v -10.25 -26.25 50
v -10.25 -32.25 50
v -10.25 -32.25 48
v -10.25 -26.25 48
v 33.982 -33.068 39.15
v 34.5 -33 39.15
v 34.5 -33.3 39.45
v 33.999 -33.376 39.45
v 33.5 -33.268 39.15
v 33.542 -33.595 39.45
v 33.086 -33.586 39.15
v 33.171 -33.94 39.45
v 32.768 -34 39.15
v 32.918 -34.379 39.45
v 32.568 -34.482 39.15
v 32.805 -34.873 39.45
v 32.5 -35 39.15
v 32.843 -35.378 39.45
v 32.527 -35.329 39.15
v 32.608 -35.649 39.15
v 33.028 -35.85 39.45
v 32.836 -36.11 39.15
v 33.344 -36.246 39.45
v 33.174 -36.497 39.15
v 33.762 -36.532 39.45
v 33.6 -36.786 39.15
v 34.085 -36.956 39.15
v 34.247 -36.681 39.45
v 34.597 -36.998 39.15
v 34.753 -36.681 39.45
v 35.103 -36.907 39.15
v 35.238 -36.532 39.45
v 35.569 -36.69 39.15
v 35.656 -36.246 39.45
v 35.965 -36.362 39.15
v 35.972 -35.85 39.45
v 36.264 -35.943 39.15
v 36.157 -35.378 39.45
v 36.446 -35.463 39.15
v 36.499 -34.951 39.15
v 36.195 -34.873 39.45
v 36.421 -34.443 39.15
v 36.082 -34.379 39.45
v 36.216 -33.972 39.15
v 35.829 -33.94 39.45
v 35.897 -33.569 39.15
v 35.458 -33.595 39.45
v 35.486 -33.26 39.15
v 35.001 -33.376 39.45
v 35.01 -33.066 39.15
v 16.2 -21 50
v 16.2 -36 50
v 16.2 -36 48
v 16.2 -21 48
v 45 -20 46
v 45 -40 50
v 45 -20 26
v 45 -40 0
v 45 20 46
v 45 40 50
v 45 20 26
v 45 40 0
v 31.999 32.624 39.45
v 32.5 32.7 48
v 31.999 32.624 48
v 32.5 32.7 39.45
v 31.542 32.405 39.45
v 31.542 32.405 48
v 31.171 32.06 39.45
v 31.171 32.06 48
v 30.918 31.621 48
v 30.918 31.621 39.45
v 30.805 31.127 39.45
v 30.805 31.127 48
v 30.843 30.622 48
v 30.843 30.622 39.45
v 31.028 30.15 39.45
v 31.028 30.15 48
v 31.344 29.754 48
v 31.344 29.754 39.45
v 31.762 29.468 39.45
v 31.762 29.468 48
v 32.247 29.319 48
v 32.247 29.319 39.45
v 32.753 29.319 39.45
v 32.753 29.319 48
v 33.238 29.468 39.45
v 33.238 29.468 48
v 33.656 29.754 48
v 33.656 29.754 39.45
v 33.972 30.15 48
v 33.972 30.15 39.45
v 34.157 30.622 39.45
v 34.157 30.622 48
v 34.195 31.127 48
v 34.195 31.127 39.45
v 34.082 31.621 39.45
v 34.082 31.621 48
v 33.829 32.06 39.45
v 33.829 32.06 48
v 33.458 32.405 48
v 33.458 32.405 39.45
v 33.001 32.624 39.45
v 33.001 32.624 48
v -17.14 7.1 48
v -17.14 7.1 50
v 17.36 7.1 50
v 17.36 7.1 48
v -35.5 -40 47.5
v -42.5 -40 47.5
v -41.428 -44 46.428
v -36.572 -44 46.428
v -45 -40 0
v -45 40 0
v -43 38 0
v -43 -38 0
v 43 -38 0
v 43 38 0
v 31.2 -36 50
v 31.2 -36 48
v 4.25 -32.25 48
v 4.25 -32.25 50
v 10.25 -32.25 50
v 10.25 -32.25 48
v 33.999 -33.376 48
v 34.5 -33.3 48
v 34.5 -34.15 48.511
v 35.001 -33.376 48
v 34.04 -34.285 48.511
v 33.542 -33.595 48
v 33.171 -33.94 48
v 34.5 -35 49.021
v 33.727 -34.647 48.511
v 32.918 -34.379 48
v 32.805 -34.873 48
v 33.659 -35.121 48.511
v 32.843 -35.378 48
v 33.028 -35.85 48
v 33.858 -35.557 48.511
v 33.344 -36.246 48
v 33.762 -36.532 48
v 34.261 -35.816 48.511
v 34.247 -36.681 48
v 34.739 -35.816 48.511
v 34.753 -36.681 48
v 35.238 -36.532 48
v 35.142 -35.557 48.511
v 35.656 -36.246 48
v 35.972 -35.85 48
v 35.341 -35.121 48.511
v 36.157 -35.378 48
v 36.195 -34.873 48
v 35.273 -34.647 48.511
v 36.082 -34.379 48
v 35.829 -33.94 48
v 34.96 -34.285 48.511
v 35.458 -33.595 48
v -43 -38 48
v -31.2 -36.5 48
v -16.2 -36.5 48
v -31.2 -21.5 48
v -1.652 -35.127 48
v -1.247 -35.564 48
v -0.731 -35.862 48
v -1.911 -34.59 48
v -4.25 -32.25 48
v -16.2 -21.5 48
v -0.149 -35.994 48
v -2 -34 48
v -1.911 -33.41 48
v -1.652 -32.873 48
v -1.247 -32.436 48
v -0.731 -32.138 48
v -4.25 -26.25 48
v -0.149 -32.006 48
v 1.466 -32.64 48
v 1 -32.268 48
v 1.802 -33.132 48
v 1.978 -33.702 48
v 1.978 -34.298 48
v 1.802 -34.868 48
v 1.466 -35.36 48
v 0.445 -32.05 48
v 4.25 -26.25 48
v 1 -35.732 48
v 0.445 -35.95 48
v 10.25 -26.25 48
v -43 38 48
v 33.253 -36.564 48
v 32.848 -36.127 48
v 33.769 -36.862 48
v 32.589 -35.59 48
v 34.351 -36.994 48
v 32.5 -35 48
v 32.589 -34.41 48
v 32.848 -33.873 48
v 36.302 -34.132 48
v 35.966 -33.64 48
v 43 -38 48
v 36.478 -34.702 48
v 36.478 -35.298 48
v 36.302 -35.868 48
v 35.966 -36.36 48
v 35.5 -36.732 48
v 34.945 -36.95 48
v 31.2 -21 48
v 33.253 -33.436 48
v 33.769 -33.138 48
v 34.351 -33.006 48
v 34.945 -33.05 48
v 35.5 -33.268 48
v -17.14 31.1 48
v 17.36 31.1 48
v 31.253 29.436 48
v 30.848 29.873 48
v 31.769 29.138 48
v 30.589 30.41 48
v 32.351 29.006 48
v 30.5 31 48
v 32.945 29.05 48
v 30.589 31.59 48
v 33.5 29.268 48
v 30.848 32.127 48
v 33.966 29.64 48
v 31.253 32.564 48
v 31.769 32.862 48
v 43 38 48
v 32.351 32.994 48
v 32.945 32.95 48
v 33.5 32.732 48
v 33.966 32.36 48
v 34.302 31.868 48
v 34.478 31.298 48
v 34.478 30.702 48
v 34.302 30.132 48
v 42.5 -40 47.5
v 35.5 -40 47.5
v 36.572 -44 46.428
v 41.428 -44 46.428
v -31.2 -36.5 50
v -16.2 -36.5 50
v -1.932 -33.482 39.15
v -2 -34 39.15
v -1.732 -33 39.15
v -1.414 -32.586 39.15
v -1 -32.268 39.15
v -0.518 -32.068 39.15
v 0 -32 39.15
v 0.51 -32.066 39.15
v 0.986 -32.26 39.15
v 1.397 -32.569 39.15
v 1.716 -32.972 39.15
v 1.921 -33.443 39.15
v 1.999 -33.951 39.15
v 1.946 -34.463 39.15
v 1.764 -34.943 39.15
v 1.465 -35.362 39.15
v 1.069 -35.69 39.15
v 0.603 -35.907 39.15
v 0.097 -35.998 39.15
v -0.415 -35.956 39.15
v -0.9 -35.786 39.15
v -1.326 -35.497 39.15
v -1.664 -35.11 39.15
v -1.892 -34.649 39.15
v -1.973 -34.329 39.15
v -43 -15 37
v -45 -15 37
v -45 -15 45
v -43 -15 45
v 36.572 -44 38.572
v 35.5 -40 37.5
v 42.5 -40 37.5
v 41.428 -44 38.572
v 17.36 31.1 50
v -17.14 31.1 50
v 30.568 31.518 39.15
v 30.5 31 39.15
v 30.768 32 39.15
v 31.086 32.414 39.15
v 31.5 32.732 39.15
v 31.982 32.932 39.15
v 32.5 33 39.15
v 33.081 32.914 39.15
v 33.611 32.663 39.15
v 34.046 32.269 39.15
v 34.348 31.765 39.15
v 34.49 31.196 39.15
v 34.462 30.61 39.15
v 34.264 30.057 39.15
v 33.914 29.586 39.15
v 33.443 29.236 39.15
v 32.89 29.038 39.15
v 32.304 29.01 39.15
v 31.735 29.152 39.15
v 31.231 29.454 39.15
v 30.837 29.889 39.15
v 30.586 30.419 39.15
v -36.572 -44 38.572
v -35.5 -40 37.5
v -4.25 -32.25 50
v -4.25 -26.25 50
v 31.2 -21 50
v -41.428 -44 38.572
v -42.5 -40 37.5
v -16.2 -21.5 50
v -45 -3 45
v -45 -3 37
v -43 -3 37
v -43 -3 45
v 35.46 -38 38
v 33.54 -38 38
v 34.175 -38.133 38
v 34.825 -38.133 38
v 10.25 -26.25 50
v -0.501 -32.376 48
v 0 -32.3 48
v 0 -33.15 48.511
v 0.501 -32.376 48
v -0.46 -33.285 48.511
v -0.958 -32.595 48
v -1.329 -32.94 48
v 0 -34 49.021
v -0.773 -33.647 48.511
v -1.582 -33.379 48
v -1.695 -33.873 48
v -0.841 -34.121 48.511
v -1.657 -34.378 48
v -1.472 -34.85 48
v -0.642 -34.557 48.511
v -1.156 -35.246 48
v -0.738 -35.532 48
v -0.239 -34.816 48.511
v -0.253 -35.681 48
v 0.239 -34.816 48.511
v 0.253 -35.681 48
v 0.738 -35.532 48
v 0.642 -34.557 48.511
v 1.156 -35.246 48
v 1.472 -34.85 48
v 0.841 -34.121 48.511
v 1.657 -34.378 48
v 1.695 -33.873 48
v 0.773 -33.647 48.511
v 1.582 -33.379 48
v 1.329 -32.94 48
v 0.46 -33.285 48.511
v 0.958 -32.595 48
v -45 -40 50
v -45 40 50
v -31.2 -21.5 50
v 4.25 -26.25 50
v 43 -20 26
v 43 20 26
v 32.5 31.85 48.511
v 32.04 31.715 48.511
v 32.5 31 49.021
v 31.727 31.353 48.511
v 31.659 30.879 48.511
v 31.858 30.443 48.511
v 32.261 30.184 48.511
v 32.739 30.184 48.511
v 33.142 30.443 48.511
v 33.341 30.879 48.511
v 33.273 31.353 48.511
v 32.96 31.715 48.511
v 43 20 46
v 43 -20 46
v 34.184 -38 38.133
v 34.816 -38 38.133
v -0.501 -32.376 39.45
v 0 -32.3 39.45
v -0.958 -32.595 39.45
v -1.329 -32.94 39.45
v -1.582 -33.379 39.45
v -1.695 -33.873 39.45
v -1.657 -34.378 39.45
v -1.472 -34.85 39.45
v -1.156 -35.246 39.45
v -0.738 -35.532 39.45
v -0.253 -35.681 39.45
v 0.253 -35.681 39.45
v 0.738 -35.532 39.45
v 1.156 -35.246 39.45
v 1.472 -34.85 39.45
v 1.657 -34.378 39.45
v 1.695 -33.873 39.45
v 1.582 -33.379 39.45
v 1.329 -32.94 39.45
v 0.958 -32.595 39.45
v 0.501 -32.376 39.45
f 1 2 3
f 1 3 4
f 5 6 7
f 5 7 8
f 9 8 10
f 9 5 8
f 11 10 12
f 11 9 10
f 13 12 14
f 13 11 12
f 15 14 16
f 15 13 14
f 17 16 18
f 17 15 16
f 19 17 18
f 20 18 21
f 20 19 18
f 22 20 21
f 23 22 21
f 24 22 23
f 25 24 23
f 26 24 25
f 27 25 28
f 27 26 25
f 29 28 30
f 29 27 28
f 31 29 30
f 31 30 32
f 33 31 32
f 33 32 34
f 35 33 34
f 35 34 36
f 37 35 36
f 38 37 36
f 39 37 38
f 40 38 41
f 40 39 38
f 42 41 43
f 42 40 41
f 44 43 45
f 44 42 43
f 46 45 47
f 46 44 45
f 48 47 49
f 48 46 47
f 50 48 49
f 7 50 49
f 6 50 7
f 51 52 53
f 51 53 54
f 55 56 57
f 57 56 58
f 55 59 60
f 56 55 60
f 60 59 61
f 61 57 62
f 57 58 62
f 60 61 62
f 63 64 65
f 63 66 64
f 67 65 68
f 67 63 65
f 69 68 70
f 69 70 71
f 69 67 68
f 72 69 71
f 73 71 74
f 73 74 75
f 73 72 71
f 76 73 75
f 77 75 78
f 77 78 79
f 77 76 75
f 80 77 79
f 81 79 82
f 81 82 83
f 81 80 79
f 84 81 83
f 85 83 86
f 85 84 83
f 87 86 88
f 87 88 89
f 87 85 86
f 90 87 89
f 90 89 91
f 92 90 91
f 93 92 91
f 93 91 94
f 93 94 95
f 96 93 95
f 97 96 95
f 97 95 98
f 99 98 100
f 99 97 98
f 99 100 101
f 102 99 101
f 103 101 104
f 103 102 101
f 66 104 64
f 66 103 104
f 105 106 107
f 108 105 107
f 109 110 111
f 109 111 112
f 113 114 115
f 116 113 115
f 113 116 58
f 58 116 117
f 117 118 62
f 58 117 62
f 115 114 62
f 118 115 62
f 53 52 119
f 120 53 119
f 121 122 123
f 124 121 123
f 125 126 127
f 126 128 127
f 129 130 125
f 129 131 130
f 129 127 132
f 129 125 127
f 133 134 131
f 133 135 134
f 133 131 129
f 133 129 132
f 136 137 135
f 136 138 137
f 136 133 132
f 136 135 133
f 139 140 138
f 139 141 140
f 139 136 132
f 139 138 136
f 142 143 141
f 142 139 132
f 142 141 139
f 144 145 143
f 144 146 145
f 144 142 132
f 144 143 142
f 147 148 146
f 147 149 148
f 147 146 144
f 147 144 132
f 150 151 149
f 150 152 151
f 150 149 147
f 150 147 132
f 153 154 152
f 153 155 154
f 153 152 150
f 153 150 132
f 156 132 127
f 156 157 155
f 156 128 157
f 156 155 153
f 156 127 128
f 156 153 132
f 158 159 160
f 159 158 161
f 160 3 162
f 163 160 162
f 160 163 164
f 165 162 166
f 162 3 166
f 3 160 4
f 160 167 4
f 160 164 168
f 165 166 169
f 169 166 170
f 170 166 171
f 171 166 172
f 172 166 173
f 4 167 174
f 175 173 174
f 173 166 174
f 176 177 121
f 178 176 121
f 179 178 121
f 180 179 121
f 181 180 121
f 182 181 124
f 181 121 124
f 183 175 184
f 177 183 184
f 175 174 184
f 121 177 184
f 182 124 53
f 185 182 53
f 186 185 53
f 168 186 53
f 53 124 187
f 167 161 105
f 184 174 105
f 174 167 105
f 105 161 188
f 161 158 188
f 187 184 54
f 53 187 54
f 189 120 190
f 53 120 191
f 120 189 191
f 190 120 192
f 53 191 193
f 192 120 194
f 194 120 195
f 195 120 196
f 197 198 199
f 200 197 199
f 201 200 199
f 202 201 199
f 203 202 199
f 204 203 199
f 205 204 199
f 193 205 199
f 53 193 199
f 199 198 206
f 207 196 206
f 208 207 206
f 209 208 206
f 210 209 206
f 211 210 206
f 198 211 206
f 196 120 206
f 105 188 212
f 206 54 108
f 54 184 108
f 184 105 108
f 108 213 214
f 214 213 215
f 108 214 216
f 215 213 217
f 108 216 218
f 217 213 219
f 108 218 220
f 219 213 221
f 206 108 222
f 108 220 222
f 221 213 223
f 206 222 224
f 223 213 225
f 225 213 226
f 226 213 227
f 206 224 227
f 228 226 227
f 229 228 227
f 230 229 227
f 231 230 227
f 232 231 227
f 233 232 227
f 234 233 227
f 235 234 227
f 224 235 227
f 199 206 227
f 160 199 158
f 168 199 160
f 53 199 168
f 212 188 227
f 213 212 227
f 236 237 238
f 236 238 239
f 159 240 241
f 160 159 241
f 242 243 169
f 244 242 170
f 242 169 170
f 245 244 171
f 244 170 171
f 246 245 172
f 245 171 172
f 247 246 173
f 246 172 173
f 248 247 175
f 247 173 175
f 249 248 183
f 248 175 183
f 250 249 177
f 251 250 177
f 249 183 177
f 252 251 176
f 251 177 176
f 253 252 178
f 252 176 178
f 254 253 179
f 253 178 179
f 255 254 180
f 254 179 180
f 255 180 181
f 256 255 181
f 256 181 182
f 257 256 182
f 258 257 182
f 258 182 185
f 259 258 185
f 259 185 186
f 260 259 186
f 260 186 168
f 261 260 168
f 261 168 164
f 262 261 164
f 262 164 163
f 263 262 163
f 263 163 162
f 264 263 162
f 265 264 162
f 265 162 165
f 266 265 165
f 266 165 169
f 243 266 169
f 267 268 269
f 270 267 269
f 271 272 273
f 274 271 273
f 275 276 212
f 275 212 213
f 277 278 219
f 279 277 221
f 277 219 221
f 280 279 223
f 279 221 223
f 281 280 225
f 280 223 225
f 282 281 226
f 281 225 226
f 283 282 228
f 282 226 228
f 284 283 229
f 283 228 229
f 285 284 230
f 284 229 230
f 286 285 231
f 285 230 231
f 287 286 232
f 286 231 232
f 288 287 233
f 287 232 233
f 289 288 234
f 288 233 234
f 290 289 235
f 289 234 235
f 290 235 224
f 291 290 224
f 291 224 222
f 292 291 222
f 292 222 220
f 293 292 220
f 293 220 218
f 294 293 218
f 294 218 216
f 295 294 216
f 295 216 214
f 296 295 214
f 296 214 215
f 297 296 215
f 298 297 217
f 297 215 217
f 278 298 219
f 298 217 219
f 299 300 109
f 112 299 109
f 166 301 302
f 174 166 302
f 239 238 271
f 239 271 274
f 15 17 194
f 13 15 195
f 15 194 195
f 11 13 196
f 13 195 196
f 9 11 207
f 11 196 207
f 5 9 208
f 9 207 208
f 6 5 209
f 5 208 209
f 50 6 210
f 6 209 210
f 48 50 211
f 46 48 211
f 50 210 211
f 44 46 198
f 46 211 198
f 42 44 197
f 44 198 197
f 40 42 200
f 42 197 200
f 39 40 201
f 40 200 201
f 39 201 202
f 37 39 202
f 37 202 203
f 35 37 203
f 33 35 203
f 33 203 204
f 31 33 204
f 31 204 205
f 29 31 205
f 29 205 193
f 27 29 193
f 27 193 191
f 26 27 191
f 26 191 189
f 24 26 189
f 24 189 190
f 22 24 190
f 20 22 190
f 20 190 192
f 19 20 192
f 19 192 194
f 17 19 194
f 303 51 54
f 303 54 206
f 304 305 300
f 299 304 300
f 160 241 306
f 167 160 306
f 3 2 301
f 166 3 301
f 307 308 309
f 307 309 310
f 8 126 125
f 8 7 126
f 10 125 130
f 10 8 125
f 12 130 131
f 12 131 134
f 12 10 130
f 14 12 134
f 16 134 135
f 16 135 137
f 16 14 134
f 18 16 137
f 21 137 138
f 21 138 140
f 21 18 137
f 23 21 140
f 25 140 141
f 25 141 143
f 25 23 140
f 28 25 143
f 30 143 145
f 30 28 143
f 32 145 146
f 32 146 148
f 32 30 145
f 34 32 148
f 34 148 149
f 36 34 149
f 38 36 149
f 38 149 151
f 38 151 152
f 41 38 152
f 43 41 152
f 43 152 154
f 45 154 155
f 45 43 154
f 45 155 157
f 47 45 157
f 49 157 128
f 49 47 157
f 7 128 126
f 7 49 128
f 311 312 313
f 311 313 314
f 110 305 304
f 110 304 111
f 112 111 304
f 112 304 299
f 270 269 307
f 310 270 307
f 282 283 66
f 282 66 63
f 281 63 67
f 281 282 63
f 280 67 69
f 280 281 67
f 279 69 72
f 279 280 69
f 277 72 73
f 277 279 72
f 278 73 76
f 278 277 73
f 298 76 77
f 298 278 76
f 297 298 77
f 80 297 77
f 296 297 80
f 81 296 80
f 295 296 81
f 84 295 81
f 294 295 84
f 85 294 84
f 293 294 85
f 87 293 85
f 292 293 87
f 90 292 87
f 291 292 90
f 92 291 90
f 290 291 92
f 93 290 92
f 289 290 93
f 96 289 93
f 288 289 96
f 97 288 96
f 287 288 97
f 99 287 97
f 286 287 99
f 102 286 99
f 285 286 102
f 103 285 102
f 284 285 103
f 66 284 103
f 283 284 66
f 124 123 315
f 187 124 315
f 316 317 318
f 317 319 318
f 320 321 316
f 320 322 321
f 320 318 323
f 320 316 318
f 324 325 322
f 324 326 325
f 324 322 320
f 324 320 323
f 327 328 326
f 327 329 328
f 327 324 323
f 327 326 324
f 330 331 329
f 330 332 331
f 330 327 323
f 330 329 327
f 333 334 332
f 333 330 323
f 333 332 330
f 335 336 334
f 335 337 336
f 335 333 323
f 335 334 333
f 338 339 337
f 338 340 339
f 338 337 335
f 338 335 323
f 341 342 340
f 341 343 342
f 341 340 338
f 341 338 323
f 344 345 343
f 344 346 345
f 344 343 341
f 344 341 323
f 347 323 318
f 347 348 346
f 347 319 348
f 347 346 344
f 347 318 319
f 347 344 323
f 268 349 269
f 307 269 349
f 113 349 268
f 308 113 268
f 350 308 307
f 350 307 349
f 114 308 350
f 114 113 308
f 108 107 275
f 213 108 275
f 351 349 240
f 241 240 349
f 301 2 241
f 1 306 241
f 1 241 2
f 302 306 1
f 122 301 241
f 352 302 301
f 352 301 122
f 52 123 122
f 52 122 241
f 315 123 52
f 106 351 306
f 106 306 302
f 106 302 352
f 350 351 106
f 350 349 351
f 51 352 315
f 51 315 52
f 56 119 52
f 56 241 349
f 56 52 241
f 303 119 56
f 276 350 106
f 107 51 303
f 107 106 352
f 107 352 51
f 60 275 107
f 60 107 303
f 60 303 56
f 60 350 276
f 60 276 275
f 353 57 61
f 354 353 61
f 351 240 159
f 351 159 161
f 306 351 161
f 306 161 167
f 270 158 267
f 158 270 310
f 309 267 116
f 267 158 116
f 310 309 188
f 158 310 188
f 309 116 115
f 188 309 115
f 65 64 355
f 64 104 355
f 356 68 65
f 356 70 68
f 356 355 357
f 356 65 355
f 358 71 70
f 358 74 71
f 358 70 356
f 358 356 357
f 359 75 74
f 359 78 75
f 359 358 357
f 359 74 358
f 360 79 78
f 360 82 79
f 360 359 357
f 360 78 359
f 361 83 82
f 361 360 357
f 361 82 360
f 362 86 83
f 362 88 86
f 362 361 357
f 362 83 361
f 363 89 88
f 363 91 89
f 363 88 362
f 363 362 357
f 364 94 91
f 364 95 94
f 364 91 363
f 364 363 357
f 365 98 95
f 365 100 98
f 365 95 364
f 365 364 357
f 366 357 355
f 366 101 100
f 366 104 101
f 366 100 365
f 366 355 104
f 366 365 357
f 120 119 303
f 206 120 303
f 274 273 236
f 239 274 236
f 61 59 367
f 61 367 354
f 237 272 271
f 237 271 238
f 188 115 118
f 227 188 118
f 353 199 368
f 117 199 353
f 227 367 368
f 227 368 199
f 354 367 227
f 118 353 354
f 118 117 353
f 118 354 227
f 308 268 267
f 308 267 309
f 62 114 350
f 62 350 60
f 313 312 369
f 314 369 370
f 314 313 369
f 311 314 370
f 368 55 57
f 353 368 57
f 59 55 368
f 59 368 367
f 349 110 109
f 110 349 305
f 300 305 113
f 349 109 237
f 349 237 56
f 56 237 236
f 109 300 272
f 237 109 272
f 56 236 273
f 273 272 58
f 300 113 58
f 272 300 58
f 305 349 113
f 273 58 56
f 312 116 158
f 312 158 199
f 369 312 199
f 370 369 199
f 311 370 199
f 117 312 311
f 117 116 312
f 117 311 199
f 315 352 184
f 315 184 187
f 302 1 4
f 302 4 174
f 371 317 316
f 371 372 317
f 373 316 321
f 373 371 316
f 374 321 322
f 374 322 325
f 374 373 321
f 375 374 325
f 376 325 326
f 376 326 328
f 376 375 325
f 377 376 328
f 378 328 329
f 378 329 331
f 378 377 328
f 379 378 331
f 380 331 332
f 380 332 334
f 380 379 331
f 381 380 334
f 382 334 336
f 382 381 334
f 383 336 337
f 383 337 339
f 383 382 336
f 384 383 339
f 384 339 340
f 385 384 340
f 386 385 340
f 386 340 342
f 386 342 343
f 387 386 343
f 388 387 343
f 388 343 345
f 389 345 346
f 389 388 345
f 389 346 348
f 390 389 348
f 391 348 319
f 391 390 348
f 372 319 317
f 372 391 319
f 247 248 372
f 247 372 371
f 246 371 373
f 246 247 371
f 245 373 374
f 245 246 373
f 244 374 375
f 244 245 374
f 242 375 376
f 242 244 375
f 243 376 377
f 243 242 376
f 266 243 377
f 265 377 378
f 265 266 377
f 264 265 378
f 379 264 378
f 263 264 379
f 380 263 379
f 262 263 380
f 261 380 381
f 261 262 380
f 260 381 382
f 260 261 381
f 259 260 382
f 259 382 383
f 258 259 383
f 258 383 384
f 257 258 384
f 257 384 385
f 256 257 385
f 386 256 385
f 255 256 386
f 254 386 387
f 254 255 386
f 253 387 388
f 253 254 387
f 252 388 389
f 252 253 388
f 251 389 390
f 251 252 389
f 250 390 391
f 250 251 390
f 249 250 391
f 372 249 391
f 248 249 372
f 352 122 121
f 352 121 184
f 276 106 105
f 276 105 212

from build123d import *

# Parameters (mm, degrees)
SKETCH1_W                                      = 90
SKETCH1_H                                      = 80
BOSS_EXTRUDE1_DEPTH                            = 50
SHELL1_T                                       = -2
SKETCH2_W                                      = 34.5
SKETCH2_H                                      = 24
CUT_EXTRUDE_DEPTH                              = 2
SKETCH3_W                                      = 15
SKETCH3_H                                      = 15
SKETCH3_W_2                                    = 6
SKETCH3_H_2                                    = 6
CUT_EXTRUDE2_DEPTH                             = 2
SKETCH4_R                                      = 2
BOSS_EXTRUDE3_DEPTH                            = 10
SKETCH7_W                                      = 7
SKETCH7_H                                      = 10
BOSS_EXTRUDE4_DEPTH                            = 4
BOSS_EXTRUDE4_DRAFT                            = 15
BOSS_EXTRUDE4_PROFILE_2_DEPTH                  = 4
BOSS_EXTRUDE4_PROFILE_2_DRAFT                  = 15
SKETCH11_W                                     = 8
SKETCH11_H                                     = 12
CUT_EXTRUDE3_DEPTH                             = 10
SKETCH12_W                                     = 20
SKETCH12_H                                     = 40
CUT_EXTRUDE4_DEPTH                             = 10
CSK_FOR_M3_OVAL_HEAD_MACHINE_SCREW1_AT_2_COUNT = 2
CSK_FOR_M3_OVAL_HEAD_MACHINE_SCREW1_AT_2_PITCH = 66.030296077
CSK_FOR_M3_OVAL_HEAD_MACHINE_SCREW1_AT_3_COUNT = 2
CSK_FOR_M3_OVAL_HEAD_MACHINE_SCREW1_AT_3_PITCH = 72.672209269


with BuildPart() as part:
    # Sketch1 → Boss-Extrude1 (new body)
    with BuildSketch(Plane.XY):
        Rectangle(SKETCH1_W, SKETCH1_H)
    extrude(amount=BOSS_EXTRUDE1_DEPTH)

    # Shell1
    shell1_openings = [part.faces().sort_by_distance(p)[0] for p in [
        (0, 0, 0),
    ]]
    offset(amount=SHELL1_T, openings=shell1_openings, kind=Kind.INTERSECTION)

    # Sketch2 → Cut-Extrude (cut)
    with BuildSketch(Plane.XY.offset(50)):
        with Locations((0.11, 19.1)):
            Rectangle(SKETCH2_W, SKETCH2_H)
    extrude(amount=-CUT_EXTRUDE_DEPTH, mode=Mode.SUBTRACT)

    # Sketch3 → Cut-Extrude2 (cut)
    with BuildSketch(Plane.XY.offset(50)):
        with Locations((23.7, -28.5)):
            Rectangle(SKETCH3_W, SKETCH3_H)
        with Locations((-23.7, -29)):
            Rectangle(SKETCH3_W, SKETCH3_H)
        with Locations((-7.25, -29.25)):
            Rectangle(SKETCH3_W_2, SKETCH3_H_2)
        with Locations((7.25, -29.25)):
            Rectangle(SKETCH3_W_2, SKETCH3_H_2)
    extrude(amount=-CUT_EXTRUDE2_DEPTH, mode=Mode.SUBTRACT)

    # Sketch4 → Boss-Extrude3 (add)
    with BuildSketch(Plane(origin=(0, 0, 48), x_dir=(-1, 0, 0), z_dir=(0, 0, -1))):
        with Locations((-34.5, -35)):
            Circle(SKETCH4_R)
        with Locations((0, -34)):
            Circle(SKETCH4_R)
        with Locations((-32.5, 31)):
            Circle(SKETCH4_R)
    extrude(amount=BOSS_EXTRUDE3_DEPTH)


with BuildPart() as boss_extrude4_tool:
    # Sketch7 → Boss-Extrude4 (with draft: the straight prism first)
    with BuildSketch(Plane.XZ.offset(40)):
        with Locations((-39, 42.5)):
            Rectangle(SKETCH7_W, SKETCH7_H)
    extrude(amount=BOSS_EXTRUDE4_DEPTH)
    # Boss-Extrude4: the draft: its side faces are tilted about the plane it starts from
    boss_extrude4_sides = [boss_extrude4_tool.faces().sort_by_distance(p)[0] for p in [
        (-42.5, -42, 42.5),
        (-39, -42, 37.5),
        (-35.5, -42, 42.5),
        (-39, -42, 47.5),
    ]]
    draft(boss_extrude4_sides, Plane.XZ.offset(40), BOSS_EXTRUDE4_DRAFT)


with BuildPart() as part_1:
    add(part.part)

    # Boss-Extrude4: add boss_extrude4_tool
    add(boss_extrude4_tool.part)


with BuildPart() as boss_extrude4_profile_2_tool:
    # Sketch7 → Boss-Extrude4 profile 2 (with draft: the straight prism first)
    with BuildSketch(Plane.XZ.offset(40)):
        with Locations((39, 42.5)):
            Rectangle(SKETCH7_W, SKETCH7_H)
    extrude(amount=BOSS_EXTRUDE4_PROFILE_2_DEPTH)
    # Boss-Extrude4 profile 2: the draft: its side faces are tilted about the plane it starts from
    boss_extrude4_profile_2_sides = [boss_extrude4_profile_2_tool.faces().sort_by_distance(p)[0] for p in [
        (35.5, -42, 42.5),
        (39, -42, 37.5),
        (42.5, -42, 42.5),
        (39, -42, 47.5),
    ]]
    draft(boss_extrude4_profile_2_sides, Plane.XZ.offset(40), BOSS_EXTRUDE4_PROFILE_2_DRAFT)


with BuildPart() as part_2:
    add(part_1.part)

    # Boss-Extrude4 profile 2: add boss_extrude4_profile_2_tool
    add(boss_extrude4_profile_2_tool.part)

    # Sketch11 → Cut-Extrude3 (cut)
    with BuildSketch(Plane.ZY.offset(45)):
        with Locations((41, -9)):
            Rectangle(SKETCH11_W, SKETCH11_H)
    extrude(amount=-CUT_EXTRUDE3_DEPTH, mode=Mode.SUBTRACT)

    # Sketch12 → Cut-Extrude4 (cut)
    with BuildSketch(Plane(origin=(45, 0, 0), x_dir=(0, 0, -1), z_dir=(1, 0, 0))):
        with Locations((-36, 0)):
            Rectangle(SKETCH12_W, SKETCH12_H)
    extrude(amount=-CUT_EXTRUDE4_DEPTH, mode=Mode.SUBTRACT)

    # Sketch14 → CSK for M3 Oval Head Machine Screw1 (revolve, cut)
    with BuildSketch(Plane(origin=(32.5, 31, 38), x_dir=(0, 1, 0), z_dir=(1, 0, 0))):
        Polygon((0, 0), (0, 11.021463052), (1.7, 10), (1.7, 1.45), (3.15, 0), align=None)
    csk_for_m3_oval_head_machine_screw1 = revolve(axis=Axis((32.5, 31, 31.65), (0, 0, 1)), mode=Mode.SUBTRACT)

    # CSK for M3 Oval Head Machine Screw1 at 2: CSK for M3 Oval Head Machine Screw1 ×2
    with Locations(*[Vector(0.030289126640769028, -0.9995411791453814, 0) * (i * CSK_FOR_M3_OVAL_HEAD_MACHINE_SCREW1_AT_2_PITCH) for i in range(1, CSK_FOR_M3_OVAL_HEAD_MACHINE_SCREW1_AT_2_COUNT)]):
        add(csk_for_m3_oval_head_machine_screw1, mode=Mode.SUBTRACT)

    # CSK for M3 Oval Head Machine Screw1 at 3: CSK for M3 Oval Head Machine Screw1 ×2
    with Locations(*[Vector(-0.447213595499958, -0.894427190999916, 0) * (i * CSK_FOR_M3_OVAL_HEAD_MACHINE_SCREW1_AT_3_PITCH) for i in range(1, CSK_FOR_M3_OVAL_HEAD_MACHINE_SCREW1_AT_3_COUNT)]):
        add(csk_for_m3_oval_head_machine_screw1, mode=Mode.SUBTRACT)


solid = part_2.part
